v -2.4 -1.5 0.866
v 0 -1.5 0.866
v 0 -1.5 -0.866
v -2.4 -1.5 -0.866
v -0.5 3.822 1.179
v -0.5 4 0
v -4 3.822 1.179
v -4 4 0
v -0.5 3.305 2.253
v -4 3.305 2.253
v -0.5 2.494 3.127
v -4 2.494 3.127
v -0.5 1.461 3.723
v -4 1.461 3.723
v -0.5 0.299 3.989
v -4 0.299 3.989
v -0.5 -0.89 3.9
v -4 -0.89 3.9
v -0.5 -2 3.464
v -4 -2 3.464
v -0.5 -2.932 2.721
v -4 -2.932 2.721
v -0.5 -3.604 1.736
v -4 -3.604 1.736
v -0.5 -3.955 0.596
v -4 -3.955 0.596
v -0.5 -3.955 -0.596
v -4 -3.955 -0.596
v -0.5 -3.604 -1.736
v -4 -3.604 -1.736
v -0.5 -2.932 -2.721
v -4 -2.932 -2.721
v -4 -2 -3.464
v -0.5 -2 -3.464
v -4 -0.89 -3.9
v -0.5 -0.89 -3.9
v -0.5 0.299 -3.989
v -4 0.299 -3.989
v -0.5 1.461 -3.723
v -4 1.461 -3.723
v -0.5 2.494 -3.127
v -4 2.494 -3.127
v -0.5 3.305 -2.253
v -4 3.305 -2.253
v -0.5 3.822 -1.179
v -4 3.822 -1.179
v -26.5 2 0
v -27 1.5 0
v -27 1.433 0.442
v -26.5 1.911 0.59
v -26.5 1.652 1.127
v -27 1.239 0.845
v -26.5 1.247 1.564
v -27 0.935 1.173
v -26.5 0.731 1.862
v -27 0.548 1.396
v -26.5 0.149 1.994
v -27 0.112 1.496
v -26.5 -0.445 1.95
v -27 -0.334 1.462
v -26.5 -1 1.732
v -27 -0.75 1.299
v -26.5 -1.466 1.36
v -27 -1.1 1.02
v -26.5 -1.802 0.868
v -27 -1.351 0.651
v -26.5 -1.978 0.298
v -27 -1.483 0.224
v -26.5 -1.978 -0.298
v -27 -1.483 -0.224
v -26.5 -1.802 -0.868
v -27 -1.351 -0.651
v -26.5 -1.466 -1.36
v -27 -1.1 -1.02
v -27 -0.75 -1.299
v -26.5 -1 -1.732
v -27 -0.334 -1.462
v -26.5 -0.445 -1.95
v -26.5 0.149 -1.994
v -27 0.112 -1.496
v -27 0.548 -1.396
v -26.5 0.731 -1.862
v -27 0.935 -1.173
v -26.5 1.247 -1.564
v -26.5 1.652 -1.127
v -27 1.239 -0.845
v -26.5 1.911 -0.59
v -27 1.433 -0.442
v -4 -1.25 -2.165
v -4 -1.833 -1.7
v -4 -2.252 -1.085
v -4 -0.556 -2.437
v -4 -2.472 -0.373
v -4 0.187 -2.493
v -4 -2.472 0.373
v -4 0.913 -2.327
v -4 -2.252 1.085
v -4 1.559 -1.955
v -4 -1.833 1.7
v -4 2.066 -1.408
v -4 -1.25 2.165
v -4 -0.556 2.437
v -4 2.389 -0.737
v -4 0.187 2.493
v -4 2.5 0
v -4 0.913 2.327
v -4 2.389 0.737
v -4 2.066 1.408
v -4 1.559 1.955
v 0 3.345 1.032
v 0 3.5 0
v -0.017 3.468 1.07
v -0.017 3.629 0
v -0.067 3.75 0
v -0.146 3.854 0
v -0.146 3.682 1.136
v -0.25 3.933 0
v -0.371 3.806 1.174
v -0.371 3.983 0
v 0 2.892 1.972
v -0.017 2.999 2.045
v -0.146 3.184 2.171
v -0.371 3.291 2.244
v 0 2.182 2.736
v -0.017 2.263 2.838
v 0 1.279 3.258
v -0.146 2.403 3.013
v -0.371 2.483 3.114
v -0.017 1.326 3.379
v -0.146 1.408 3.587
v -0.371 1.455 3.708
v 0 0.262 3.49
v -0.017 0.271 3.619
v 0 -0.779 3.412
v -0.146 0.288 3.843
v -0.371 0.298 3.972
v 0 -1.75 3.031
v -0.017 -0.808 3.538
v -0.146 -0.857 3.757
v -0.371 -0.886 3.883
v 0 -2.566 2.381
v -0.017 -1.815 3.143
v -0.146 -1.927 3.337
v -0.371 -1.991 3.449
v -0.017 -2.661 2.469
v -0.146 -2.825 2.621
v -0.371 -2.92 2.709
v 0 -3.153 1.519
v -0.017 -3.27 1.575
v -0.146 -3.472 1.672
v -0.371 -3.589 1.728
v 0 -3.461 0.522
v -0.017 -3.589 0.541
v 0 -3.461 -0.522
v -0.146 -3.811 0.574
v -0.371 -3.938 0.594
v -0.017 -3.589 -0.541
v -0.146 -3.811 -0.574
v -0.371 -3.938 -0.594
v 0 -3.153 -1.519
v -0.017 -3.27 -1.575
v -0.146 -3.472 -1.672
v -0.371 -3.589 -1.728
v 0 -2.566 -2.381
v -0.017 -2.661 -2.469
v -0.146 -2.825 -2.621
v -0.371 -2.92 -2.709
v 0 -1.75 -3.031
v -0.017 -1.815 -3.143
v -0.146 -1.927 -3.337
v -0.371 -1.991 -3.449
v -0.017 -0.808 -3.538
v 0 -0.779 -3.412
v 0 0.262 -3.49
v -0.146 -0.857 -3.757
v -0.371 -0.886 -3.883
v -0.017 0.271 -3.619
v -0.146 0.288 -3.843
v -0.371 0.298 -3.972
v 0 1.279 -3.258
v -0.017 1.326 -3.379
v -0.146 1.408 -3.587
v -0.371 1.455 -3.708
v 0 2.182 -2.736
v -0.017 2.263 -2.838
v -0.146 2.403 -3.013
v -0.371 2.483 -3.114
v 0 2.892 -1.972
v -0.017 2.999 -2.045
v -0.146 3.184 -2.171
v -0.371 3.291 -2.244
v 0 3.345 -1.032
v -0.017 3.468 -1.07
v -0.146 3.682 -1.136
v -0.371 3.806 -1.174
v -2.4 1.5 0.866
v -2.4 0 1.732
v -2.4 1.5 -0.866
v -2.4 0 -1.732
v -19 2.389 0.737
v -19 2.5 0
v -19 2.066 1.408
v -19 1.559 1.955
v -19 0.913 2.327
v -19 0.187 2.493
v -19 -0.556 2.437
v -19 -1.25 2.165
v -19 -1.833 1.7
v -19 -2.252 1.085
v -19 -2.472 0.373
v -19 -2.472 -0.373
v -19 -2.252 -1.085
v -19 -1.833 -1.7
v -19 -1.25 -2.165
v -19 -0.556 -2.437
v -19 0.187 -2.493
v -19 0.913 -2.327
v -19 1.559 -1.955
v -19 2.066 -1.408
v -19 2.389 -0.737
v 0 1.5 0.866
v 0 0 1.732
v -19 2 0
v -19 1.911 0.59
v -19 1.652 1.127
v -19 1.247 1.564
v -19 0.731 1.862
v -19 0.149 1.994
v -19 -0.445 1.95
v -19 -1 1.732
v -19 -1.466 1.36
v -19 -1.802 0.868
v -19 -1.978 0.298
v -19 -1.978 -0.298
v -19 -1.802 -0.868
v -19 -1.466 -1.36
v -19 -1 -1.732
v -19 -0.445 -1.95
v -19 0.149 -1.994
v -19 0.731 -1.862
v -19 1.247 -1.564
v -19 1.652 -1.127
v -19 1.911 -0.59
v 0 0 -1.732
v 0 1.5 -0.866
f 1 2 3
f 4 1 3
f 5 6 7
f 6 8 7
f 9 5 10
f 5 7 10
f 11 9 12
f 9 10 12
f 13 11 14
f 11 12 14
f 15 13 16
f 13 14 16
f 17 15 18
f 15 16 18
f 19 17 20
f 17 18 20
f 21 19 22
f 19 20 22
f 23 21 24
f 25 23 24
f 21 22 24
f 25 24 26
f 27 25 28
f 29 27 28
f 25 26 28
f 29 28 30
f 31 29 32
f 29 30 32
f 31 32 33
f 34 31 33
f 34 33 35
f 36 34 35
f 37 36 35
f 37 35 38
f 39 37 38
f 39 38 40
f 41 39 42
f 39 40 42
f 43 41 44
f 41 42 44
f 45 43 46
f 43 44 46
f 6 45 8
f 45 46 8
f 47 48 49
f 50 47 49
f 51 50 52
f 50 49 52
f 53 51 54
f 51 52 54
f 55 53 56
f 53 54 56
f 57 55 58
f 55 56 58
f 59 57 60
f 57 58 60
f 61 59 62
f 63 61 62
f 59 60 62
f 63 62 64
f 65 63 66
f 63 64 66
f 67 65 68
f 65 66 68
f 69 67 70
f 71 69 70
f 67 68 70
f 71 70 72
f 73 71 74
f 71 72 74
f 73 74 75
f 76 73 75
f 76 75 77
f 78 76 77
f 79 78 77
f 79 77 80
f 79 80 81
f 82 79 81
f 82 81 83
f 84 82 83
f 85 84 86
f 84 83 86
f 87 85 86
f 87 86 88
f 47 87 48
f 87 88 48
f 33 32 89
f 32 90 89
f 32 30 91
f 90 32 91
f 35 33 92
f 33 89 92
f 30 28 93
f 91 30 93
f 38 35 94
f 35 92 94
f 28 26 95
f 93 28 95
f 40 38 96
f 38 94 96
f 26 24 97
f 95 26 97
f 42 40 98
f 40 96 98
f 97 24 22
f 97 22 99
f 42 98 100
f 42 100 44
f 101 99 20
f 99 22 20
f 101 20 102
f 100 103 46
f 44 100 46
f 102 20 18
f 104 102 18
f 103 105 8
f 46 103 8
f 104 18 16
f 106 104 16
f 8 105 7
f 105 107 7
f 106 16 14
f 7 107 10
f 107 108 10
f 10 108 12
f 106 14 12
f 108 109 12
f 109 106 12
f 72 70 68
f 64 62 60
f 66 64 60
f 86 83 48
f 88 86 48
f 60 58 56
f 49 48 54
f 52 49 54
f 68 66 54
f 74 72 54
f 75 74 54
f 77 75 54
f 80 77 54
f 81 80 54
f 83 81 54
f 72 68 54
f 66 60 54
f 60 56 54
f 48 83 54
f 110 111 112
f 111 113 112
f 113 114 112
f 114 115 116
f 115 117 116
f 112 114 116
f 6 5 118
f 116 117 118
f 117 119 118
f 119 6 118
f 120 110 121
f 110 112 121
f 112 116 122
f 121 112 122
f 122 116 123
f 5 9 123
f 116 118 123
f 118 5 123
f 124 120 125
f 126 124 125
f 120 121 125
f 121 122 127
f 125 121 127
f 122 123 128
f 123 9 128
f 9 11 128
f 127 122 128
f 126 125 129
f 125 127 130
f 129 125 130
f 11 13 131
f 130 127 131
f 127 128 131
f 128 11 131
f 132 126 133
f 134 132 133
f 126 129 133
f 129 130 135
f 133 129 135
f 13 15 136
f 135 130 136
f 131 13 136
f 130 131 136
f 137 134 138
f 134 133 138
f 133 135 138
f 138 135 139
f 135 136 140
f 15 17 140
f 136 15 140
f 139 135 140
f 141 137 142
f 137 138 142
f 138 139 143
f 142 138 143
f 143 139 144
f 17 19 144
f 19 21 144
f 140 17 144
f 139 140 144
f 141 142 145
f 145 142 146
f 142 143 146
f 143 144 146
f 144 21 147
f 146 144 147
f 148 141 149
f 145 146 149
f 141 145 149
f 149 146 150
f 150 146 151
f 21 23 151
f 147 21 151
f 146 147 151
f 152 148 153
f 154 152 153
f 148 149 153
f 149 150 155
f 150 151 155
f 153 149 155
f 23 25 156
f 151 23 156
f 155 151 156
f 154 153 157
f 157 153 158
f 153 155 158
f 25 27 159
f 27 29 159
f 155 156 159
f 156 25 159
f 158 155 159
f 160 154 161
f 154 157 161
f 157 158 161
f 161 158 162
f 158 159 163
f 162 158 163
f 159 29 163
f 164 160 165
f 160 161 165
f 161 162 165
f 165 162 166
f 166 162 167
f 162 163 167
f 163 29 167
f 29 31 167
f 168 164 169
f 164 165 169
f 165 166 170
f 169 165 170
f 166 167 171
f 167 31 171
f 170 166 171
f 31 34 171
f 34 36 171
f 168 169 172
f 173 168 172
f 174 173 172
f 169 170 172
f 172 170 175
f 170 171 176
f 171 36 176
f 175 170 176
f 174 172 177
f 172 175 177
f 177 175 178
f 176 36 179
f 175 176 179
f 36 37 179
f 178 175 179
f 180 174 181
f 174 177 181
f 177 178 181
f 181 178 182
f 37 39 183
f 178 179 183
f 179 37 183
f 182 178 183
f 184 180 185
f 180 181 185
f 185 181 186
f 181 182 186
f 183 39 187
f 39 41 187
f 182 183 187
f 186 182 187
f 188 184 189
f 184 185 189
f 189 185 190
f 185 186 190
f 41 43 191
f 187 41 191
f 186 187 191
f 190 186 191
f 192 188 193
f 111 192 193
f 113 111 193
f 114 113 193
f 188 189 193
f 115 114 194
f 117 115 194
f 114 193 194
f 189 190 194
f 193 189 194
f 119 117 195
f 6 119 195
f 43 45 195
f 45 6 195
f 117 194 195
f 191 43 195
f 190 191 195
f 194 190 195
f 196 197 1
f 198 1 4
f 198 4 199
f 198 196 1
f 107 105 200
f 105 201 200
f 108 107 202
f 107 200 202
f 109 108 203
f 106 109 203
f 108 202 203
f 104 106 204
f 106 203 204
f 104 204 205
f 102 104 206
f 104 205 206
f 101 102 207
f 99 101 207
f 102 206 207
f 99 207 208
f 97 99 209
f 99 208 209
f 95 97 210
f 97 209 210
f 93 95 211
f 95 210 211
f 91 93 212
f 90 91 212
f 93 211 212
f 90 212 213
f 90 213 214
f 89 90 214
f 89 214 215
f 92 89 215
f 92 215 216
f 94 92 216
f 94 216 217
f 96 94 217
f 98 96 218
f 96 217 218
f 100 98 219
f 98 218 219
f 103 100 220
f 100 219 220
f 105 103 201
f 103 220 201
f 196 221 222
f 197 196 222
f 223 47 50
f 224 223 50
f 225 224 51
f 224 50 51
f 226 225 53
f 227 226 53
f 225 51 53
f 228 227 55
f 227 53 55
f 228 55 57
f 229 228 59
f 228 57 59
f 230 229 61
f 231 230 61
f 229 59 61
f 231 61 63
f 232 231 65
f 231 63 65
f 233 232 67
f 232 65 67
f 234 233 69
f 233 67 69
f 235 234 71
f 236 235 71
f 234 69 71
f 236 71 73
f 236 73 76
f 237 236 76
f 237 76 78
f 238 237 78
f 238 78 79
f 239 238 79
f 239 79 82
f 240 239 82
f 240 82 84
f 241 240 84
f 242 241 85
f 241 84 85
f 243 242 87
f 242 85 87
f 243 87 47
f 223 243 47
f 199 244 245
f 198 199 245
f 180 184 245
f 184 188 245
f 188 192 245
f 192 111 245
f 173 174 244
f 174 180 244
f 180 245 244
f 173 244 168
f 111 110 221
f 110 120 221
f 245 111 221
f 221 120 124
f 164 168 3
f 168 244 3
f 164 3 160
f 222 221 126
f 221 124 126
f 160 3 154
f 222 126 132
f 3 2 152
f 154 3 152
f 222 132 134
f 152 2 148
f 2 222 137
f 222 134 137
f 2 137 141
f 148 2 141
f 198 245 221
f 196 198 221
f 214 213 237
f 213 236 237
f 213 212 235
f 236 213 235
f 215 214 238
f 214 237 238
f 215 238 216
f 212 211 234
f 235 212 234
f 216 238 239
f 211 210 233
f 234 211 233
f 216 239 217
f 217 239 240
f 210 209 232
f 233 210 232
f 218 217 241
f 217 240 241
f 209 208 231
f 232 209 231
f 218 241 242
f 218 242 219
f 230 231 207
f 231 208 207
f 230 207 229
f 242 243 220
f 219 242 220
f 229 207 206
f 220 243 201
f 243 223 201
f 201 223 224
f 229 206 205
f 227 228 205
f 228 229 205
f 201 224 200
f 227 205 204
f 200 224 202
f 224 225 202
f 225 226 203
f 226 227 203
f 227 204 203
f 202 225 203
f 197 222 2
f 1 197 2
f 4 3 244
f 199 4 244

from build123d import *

# Parameters (mm, degrees)
CHAMFER1_SIZE      = 0.5
CUT_EXTRUDE1_DEPTH = 2.4


with BuildPart() as part:
    # Sketch1 → Revolve1 (revolve)
    with BuildSketch(Plane.XY):
        with BuildLine():
            Line((0, 0), (0, 3.5))
            ThreePointArc((0, 3.5), (-0.146446609, 3.853553391), (-0.5, 4))
            Line((-0.5, 4), (-4, 4))
            Line((-4, 4), (-4, 2.5))
            Line((-4, 2.5), (-19, 2.5))
            Line((-19, 2.5), (-19, 2))
            Line((-19, 2), (-27, 2))
            Line((-27, 2), (-27, 0))
            Line((-27, 0), (0, 0))
        make_face()
    revolve(axis=Axis((0, 0, 0), (1, 0, 0)))

    # Chamfer1
    chamfer1_edges = [part.edges().sort_by_distance(p)[0] for p in [
        (-27, -2, 0),
    ]]
    chamfer(chamfer1_edges, length=CHAMFER1_SIZE)

    # Sketch2 → Cut-Extrude1 (cut)
    with BuildSketch(Plane(origin=(0, 0, 0), x_dir=(0, 0, -1), z_dir=(1, 0, 0))):
        Polygon((1.732050808, 0), (0.866025404, 1.5), (-0.866025404, 1.5), (-1.732050808, 0), (-0.866025404, -1.5), (0.866025404, -1.5), align=None)
    extrude(amount=-CUT_EXTRUDE1_DEPTH, mode=Mode.SUBTRACT)


solid = part.part
